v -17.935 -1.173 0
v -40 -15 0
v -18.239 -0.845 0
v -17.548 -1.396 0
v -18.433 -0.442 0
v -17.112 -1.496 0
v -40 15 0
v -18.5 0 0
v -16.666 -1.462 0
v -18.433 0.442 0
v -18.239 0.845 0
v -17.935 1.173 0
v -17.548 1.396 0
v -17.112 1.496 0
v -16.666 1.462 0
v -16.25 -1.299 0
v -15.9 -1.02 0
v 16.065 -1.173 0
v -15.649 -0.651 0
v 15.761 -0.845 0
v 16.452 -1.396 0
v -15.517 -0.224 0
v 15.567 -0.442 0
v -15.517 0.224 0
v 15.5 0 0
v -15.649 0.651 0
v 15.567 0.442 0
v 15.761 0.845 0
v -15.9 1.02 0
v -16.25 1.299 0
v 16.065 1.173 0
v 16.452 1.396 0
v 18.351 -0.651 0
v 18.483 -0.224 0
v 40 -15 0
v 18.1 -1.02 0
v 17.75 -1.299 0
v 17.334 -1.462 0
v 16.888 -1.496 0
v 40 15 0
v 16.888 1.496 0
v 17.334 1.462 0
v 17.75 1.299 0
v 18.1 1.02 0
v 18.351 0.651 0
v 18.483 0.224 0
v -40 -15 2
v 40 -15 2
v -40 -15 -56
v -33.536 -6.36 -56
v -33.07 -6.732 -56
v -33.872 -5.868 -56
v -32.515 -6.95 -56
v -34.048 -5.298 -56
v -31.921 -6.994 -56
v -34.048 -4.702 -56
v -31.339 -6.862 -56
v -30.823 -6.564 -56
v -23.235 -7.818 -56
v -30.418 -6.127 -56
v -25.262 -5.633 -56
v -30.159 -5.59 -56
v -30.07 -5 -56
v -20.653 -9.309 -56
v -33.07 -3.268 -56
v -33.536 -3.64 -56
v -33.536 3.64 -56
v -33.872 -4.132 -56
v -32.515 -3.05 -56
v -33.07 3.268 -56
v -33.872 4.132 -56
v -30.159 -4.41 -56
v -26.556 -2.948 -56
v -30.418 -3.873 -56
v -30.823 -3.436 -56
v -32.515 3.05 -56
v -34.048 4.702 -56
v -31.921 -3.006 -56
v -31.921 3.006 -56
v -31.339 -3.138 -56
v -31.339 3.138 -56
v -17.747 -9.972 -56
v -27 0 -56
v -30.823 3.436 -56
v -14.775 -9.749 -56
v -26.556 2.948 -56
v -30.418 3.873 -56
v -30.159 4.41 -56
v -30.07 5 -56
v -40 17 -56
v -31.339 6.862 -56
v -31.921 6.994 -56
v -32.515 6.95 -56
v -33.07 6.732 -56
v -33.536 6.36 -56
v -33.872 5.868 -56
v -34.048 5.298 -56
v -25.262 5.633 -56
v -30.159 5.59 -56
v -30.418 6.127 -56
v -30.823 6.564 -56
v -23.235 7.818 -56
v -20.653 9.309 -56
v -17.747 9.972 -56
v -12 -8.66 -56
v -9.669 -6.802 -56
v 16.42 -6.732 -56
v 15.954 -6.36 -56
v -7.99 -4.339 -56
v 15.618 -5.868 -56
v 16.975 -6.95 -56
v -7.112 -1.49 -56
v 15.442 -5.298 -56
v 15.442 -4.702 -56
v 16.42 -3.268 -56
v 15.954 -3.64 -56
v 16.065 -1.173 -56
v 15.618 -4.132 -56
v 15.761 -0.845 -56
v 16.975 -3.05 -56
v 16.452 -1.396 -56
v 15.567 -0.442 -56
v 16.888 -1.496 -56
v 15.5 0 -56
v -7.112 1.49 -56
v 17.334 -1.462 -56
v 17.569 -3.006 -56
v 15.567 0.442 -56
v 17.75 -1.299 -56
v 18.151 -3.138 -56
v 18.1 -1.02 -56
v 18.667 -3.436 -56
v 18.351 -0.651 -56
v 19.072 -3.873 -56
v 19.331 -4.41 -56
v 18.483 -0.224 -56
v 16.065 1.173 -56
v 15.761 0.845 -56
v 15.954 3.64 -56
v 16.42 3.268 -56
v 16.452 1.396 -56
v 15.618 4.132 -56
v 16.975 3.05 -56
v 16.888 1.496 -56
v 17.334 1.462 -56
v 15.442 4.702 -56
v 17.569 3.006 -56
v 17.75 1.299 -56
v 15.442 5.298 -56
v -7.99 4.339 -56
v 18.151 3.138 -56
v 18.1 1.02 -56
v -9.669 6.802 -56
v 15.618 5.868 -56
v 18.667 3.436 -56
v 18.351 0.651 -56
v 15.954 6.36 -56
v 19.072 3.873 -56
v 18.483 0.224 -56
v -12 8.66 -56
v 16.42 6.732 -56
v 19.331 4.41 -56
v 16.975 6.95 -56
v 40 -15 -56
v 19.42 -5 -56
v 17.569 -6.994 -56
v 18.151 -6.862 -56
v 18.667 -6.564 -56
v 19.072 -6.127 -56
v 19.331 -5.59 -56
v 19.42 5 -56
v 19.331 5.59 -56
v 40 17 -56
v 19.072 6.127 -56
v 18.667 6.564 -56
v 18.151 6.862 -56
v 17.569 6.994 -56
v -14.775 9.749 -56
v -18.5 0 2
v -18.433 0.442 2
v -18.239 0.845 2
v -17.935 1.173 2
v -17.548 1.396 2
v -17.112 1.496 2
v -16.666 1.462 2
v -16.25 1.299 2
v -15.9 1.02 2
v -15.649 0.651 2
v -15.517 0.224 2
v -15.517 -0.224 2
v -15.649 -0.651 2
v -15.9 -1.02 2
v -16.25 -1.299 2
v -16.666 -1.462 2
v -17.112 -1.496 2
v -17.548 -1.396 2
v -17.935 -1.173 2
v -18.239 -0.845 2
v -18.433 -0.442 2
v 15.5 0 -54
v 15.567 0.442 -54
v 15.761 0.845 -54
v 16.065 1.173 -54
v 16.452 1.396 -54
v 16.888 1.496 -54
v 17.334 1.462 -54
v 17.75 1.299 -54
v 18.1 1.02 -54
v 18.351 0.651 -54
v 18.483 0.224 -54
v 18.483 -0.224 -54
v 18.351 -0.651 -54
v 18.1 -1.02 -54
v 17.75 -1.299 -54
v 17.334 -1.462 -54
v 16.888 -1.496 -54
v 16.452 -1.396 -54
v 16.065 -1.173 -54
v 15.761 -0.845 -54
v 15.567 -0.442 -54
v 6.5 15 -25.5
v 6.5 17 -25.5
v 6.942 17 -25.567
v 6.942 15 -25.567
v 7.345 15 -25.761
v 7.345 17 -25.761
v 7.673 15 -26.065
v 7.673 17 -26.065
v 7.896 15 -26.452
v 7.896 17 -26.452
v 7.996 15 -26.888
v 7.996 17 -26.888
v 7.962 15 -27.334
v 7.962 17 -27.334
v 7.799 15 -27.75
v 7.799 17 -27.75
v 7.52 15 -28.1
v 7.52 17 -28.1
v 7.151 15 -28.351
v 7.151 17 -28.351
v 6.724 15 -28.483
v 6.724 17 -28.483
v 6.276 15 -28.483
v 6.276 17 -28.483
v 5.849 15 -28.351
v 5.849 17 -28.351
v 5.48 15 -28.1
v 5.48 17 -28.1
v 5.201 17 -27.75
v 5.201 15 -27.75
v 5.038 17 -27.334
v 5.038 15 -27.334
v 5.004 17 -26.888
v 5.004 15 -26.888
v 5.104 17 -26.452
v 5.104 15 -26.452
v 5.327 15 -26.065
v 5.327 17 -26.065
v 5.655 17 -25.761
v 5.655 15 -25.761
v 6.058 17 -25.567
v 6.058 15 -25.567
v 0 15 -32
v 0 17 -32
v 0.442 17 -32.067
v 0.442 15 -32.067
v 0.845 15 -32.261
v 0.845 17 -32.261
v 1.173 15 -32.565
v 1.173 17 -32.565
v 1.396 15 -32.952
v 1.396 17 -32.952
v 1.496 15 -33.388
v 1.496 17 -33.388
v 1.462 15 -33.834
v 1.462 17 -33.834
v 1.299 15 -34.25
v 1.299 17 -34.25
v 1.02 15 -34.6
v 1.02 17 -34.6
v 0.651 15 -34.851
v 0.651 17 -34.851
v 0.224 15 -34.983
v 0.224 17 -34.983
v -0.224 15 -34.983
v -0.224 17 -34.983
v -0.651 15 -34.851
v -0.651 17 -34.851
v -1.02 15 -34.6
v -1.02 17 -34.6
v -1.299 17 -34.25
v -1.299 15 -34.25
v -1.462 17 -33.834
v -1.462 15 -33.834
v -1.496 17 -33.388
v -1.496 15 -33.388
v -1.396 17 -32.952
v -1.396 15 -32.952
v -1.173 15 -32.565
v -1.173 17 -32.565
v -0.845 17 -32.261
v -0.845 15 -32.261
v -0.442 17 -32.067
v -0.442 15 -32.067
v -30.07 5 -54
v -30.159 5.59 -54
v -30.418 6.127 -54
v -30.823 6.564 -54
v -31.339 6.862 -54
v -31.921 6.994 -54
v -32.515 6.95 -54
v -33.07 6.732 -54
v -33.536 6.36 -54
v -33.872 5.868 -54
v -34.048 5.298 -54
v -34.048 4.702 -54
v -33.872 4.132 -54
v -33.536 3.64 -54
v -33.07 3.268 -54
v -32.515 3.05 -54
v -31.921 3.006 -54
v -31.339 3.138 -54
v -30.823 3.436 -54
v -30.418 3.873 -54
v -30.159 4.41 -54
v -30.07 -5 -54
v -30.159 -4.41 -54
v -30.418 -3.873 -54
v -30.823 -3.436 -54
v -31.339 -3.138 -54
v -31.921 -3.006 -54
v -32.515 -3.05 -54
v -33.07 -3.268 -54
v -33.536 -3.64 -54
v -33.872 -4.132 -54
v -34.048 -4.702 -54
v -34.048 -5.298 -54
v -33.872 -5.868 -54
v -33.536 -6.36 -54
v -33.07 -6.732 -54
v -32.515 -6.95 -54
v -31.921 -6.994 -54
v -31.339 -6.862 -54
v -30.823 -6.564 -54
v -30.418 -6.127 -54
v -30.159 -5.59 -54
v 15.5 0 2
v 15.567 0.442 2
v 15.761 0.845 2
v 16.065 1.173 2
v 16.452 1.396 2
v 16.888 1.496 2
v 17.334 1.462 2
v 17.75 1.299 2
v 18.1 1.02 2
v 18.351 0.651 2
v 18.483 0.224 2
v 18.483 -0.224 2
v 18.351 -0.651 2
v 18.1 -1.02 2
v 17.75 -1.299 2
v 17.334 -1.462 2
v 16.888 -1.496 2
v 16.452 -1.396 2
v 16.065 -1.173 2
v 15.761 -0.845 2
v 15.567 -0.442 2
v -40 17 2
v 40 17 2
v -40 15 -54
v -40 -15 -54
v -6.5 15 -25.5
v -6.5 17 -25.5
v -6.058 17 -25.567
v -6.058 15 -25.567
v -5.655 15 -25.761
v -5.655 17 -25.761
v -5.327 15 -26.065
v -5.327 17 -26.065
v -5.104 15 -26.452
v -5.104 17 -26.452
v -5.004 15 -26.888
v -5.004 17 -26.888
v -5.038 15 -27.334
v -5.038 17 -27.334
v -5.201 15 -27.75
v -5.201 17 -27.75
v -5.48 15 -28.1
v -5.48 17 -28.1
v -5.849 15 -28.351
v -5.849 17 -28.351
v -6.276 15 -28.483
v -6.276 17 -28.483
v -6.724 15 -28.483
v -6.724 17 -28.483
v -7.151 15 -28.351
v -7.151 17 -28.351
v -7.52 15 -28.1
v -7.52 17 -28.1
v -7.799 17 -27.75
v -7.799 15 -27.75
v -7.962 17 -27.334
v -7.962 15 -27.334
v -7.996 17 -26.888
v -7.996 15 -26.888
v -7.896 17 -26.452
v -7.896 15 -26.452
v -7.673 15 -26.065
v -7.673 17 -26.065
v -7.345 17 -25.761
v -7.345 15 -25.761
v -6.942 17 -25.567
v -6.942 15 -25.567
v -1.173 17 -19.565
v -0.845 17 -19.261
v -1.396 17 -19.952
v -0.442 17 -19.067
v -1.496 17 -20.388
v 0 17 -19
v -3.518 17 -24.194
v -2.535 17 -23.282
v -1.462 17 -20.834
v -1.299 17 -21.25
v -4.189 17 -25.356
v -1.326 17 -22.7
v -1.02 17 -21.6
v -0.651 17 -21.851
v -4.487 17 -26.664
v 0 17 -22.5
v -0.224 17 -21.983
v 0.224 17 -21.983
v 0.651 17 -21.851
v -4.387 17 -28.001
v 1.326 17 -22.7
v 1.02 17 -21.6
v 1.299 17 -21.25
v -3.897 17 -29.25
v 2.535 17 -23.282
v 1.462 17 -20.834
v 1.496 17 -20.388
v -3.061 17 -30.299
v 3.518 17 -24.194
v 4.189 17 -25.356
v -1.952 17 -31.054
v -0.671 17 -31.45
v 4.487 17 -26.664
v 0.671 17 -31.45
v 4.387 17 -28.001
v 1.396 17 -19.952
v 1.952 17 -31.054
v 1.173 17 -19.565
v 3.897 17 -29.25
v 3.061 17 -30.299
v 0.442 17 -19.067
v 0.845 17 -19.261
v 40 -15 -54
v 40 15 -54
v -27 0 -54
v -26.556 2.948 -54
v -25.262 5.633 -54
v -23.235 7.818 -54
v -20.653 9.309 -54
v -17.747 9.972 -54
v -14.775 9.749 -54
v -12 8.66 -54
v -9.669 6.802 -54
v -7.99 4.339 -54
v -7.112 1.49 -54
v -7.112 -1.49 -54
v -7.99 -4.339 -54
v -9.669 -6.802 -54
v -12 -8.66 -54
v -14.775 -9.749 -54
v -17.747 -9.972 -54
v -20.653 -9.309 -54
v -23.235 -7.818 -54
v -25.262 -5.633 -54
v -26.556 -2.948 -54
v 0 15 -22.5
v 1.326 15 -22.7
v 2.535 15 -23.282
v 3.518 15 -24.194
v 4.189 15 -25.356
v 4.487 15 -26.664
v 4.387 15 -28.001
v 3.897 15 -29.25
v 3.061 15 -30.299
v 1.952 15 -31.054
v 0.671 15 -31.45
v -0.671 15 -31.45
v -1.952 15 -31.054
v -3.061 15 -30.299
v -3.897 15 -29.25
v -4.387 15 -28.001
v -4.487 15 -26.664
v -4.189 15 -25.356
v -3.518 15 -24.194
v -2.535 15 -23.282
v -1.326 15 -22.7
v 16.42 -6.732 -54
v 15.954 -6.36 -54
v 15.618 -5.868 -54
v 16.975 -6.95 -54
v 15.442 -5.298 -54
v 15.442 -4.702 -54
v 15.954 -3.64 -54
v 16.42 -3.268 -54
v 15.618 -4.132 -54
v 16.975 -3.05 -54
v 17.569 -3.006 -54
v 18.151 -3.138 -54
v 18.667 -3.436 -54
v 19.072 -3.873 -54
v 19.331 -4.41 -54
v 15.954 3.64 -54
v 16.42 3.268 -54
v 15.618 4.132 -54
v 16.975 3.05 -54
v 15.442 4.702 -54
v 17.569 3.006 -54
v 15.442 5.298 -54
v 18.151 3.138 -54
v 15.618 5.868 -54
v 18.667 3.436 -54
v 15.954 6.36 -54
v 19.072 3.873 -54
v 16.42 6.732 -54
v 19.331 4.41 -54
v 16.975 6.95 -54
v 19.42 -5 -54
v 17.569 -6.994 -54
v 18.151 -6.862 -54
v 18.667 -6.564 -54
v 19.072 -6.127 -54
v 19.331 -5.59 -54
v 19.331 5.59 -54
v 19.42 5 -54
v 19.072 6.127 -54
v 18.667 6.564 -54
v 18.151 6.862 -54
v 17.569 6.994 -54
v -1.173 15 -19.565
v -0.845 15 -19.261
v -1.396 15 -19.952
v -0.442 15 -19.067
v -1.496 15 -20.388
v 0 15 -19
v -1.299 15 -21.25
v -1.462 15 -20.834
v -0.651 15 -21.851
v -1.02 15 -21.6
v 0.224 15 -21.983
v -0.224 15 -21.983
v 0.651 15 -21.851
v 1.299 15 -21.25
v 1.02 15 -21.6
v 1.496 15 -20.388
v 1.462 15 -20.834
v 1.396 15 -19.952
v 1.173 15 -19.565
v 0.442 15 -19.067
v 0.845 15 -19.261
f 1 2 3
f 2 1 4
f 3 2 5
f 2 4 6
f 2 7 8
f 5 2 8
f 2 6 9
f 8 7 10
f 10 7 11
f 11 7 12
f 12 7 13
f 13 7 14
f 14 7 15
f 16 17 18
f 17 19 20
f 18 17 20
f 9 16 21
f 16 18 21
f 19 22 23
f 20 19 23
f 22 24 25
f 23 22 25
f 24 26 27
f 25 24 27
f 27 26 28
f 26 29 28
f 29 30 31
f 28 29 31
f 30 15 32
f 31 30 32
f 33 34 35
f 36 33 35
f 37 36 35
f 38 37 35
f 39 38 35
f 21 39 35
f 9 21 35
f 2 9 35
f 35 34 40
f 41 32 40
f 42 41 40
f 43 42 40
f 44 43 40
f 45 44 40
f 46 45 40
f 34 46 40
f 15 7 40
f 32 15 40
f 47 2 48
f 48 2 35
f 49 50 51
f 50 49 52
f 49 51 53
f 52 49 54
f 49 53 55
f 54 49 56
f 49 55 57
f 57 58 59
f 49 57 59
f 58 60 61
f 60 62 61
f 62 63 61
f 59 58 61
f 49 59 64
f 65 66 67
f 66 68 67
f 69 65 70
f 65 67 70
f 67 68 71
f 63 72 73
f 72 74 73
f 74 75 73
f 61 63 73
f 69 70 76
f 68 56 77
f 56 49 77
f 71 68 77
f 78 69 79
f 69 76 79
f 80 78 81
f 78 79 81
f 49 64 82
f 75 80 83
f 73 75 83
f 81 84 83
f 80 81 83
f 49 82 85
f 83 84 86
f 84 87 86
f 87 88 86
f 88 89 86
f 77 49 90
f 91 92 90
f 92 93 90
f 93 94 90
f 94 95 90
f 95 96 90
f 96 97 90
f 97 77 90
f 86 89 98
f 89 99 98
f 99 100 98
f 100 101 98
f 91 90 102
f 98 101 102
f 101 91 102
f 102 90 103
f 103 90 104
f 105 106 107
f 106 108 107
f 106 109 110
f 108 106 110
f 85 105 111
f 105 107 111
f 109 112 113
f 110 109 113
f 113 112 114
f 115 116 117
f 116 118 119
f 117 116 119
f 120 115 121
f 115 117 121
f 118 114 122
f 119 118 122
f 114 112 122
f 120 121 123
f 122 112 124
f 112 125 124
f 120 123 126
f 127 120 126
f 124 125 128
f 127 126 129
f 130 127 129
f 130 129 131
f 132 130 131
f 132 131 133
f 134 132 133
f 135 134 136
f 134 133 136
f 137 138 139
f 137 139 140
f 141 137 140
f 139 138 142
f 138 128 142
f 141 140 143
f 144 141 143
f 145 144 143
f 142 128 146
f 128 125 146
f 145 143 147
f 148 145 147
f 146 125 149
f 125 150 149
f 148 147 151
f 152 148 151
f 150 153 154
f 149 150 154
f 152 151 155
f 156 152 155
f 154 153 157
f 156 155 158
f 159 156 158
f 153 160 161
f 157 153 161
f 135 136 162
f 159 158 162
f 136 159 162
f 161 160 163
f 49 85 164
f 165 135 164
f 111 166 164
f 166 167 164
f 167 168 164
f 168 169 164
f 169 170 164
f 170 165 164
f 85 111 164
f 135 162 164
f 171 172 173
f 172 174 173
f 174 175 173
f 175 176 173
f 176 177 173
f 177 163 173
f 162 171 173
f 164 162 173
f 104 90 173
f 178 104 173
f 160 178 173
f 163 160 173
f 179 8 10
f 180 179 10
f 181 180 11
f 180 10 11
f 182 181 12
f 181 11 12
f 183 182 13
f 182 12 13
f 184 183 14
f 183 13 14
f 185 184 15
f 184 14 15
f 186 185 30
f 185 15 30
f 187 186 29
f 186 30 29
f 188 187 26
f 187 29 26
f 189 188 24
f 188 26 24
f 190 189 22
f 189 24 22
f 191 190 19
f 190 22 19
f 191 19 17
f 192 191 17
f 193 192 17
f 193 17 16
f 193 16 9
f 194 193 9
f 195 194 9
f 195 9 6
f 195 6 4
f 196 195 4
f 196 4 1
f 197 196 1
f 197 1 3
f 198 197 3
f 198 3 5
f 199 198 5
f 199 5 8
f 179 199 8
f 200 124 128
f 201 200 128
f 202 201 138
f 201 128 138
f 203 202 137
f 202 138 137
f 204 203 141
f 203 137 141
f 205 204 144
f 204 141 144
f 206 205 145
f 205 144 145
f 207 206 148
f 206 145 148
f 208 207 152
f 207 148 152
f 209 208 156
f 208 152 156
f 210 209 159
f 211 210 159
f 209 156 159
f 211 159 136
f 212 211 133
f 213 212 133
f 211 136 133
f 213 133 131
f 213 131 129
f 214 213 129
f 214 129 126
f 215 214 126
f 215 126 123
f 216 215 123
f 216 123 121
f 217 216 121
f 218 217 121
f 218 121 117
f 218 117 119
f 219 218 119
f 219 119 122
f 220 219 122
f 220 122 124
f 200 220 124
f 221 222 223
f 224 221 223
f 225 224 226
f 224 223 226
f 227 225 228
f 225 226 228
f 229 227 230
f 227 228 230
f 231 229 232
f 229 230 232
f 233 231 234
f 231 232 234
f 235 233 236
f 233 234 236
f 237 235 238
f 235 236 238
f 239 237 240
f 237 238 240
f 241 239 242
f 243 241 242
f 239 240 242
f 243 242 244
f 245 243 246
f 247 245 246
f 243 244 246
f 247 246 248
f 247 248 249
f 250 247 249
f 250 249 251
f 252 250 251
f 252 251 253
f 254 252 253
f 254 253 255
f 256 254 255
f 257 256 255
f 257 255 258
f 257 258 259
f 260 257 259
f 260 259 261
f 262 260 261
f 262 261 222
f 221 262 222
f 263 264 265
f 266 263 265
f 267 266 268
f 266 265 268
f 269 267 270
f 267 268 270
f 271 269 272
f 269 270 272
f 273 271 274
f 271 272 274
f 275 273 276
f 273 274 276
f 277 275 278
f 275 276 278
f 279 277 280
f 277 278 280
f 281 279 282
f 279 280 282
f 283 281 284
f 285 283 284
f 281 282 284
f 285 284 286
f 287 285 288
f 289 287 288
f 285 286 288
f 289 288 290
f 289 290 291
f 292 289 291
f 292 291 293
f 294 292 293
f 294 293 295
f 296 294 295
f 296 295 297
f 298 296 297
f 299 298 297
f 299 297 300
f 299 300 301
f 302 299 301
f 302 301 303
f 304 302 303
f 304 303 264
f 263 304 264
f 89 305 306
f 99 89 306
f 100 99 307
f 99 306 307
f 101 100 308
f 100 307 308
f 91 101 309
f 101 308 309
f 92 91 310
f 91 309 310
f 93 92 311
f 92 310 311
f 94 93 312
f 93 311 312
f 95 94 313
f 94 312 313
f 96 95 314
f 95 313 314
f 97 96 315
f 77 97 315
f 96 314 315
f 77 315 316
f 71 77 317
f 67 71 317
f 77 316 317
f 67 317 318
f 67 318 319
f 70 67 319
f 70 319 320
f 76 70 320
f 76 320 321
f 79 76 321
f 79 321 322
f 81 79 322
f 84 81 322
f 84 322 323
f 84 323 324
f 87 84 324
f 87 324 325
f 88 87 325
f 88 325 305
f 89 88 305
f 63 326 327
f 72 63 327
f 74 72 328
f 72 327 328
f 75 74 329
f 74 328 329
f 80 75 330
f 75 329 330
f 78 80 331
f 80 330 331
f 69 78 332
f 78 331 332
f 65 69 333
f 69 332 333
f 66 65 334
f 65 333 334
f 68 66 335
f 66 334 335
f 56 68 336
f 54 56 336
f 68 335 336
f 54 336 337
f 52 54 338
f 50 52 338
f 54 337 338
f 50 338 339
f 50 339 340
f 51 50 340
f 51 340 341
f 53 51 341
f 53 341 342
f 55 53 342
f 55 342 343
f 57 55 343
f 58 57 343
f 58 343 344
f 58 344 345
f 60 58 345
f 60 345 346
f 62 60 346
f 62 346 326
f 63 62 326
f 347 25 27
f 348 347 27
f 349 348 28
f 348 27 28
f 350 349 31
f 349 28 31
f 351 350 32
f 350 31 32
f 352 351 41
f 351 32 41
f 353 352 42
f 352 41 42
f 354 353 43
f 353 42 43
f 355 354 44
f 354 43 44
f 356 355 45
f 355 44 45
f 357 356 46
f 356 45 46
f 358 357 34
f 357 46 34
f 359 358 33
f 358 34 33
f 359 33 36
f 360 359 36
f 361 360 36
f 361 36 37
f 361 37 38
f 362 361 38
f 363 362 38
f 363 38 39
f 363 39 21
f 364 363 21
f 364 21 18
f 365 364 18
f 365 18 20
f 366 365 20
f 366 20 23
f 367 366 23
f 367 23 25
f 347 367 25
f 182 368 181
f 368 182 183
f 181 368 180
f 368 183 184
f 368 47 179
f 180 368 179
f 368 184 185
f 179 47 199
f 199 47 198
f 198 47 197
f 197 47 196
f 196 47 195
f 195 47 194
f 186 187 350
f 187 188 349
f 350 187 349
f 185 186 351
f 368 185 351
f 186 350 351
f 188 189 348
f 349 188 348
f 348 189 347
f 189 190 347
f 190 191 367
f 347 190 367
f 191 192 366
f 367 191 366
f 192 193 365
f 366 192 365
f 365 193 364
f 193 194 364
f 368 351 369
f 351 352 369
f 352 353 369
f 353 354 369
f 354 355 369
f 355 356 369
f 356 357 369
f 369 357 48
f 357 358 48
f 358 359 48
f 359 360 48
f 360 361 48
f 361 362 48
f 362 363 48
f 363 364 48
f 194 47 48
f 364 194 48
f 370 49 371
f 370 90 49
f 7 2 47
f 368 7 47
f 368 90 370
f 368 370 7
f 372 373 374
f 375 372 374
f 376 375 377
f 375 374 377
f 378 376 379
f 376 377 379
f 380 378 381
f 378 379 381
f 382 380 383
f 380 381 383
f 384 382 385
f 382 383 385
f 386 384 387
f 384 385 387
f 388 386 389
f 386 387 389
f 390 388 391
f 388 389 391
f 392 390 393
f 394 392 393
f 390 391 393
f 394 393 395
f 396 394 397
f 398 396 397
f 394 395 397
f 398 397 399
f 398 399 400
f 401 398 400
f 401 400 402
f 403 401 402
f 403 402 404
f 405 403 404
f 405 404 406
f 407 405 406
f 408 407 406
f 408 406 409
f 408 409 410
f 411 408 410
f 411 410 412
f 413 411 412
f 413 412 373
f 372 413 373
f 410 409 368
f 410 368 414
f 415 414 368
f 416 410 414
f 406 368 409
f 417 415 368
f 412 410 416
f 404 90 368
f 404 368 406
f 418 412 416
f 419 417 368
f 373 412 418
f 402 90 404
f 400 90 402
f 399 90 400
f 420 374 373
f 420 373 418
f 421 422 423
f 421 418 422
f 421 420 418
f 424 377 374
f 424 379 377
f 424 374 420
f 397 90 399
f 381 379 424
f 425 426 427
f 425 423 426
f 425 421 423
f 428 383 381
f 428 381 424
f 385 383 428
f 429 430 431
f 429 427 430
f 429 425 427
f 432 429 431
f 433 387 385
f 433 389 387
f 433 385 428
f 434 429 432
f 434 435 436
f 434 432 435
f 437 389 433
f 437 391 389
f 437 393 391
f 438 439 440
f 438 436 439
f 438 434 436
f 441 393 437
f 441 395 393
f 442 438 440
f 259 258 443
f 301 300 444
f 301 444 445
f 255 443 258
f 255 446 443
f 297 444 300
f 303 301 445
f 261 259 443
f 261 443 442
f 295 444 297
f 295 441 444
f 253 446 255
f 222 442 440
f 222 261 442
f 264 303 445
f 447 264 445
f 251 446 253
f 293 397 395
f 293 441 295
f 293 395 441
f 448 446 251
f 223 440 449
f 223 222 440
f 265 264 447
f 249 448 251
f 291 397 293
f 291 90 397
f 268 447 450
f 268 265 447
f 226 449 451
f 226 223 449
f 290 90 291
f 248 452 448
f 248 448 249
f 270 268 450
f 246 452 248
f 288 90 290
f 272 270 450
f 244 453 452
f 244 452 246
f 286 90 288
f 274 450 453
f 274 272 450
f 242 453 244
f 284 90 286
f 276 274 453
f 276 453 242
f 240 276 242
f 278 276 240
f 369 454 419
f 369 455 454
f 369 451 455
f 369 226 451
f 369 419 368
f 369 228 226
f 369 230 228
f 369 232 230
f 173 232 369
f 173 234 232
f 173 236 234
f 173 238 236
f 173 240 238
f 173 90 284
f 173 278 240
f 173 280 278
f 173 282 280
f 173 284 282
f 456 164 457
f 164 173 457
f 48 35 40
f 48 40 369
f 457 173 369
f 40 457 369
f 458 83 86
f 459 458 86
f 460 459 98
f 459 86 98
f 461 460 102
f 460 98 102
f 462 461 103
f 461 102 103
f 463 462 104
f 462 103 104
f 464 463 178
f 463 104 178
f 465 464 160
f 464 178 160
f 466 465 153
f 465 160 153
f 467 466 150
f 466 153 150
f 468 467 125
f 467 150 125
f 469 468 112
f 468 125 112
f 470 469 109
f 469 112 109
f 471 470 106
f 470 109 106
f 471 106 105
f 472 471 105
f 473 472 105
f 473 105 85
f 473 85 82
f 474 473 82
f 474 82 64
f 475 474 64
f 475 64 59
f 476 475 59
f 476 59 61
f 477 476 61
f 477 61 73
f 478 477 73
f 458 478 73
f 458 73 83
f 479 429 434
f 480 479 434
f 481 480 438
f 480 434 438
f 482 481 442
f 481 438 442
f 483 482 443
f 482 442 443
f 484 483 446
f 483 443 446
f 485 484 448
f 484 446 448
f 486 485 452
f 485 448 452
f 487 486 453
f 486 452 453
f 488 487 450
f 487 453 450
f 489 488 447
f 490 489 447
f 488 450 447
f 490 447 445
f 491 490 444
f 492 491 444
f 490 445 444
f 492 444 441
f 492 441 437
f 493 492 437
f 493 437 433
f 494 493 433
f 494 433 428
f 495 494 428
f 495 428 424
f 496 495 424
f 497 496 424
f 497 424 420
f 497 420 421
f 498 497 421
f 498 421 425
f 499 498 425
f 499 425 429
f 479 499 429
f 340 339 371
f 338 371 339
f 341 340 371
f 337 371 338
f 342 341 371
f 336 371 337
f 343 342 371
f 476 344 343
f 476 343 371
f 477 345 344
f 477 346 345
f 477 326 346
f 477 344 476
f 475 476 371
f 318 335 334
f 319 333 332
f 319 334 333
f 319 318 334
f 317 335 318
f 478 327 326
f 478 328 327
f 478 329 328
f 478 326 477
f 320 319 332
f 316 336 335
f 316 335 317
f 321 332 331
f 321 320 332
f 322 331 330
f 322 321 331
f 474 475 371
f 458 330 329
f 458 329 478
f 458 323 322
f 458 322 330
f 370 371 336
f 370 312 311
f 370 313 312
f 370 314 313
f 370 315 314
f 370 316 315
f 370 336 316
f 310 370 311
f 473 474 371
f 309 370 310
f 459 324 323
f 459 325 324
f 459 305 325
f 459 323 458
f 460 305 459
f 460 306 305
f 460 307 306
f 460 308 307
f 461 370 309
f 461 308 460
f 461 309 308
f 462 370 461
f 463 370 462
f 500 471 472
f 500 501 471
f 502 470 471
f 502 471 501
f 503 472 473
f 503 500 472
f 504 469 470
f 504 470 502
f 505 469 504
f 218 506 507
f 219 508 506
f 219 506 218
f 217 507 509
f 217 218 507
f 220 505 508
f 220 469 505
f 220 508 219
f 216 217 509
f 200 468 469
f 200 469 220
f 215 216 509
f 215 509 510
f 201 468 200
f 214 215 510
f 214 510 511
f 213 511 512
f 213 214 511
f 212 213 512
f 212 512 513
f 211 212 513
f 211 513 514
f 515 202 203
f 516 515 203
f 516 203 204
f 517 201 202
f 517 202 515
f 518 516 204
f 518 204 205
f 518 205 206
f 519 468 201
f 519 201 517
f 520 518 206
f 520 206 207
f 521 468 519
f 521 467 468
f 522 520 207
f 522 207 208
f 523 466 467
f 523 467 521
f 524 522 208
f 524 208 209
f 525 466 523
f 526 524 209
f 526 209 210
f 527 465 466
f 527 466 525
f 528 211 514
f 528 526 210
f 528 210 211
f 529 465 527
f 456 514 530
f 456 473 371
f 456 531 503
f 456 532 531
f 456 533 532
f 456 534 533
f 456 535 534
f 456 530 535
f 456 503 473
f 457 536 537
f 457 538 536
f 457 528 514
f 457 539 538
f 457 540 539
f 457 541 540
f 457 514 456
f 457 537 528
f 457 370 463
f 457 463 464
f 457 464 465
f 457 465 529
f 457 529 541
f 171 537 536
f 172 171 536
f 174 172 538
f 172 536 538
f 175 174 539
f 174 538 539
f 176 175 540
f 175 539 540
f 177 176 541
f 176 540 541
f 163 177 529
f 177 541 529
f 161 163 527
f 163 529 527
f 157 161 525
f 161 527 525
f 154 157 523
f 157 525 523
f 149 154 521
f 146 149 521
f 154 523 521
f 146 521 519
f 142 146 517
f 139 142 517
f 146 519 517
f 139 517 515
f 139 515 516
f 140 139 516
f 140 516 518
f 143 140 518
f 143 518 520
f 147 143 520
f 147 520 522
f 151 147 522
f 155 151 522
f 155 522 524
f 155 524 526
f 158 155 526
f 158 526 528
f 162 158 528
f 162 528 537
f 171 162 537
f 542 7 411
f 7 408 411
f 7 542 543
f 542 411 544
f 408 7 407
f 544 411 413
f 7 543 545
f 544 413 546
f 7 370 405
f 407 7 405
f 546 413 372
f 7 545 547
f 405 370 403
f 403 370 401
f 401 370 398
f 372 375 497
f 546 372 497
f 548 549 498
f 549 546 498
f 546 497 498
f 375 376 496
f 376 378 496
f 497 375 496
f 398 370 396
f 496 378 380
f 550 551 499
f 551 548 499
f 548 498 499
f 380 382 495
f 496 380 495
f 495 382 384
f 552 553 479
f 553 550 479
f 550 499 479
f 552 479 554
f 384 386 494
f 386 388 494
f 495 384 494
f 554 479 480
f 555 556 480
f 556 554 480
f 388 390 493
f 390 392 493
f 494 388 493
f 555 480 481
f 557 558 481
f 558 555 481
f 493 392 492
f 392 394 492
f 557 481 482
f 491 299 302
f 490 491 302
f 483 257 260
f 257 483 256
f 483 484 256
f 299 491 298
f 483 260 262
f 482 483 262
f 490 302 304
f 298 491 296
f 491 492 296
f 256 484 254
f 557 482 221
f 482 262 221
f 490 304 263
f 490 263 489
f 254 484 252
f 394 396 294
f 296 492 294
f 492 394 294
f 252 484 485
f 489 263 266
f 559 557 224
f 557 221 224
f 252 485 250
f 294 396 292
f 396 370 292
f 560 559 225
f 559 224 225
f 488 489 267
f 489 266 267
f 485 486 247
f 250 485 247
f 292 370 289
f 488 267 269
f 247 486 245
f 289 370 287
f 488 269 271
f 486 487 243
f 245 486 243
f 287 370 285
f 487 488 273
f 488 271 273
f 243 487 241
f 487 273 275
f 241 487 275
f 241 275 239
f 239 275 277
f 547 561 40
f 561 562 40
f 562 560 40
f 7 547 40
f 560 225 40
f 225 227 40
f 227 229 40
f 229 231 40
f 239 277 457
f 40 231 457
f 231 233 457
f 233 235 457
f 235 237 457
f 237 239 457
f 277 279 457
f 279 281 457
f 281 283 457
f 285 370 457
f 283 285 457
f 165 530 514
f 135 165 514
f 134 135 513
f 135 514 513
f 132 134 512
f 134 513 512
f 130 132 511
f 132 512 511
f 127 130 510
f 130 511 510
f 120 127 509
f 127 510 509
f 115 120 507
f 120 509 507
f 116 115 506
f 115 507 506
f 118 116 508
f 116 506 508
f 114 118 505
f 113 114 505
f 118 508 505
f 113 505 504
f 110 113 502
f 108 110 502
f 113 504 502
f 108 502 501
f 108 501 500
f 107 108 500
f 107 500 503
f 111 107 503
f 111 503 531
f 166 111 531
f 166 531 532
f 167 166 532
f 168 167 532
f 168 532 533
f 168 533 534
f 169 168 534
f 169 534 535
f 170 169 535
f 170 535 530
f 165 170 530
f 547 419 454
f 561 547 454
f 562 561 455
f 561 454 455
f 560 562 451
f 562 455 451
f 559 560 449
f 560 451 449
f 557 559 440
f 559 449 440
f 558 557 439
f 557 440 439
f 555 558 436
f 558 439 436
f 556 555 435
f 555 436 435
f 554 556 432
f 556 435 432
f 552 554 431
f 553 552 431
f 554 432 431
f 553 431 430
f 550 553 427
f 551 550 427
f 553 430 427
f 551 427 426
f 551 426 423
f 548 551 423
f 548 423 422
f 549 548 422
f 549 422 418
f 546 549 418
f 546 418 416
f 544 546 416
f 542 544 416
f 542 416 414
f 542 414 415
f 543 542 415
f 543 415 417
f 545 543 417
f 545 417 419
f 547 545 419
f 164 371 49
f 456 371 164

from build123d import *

# Parameters (mm, degrees)
SKETCH_1_W          = 80
SKETCH_1_H          = 30
EXTRUDE_1_DEPTH     = 2
SKETCH_2_W          = 80
SKETCH_2_H          = 58
EXTRUDE_2_DEPTH     = 2
SKETCH_3_W          = 80
SKETCH_3_H          = 2
EXTRUDE_3_DEPTH     = 30
CUT_EXTRUDE_1_REACH = 77.895
SKETCH_5_R          = 4.5
SKETCH_5_R_2        = 1.5
CUT_EXTRUDE_3_REACH = 74.478
SKETCH_6_R          = 1.5
CUT_EXTRUDE_4_REACH = 74.478
SKETCH_7_R          = 10
CUT_EXTRUDE_5_REACH = 72.887
SKETCH_8_R          = 2
CUT_EXTRUDE_6_REACH = 72.887
SKETCH_9_R          = 2


with BuildPart() as part:
    # 草图1 → 凸台-拉伸1 (new body)
    with BuildSketch(Plane.XY):
        Rectangle(SKETCH_1_W, SKETCH_1_H)
    extrude(amount=EXTRUDE_1_DEPTH)

    # 草图2 → 凸台-拉伸2 (add)
    with BuildSketch(Plane(origin=(0, 15, 0), x_dir=(1, 0, 0), z_dir=(0, 1, 0))):
        with Locations((0, 27)):
            Rectangle(SKETCH_2_W, SKETCH_2_H)
    extrude(amount=EXTRUDE_2_DEPTH)

    # 草图3 → 凸台-拉伸3 (add)
    with BuildSketch(Plane.XZ.offset(-15)):
        with Locations((0, -55)):
            Rectangle(SKETCH_3_W, SKETCH_3_H)
    extrude(amount=EXTRUDE_3_DEPTH)

    # 草图5 → 切除-拉伸1 (cut, up to next)
    with BuildSketch(Plane(origin=(0, 17, 0), x_dir=(1, 0, 0), z_dir=(0, 1, 0)), mode=Mode.PRIVATE) as cut_extrude_1_sk1:
        with Locations(Location((0, 27, 0), (0, 0, 270))):
            Circle(SKETCH_5_R)
    cut_extrude_1_tool1 = extrude(cut_extrude_1_sk1.sketch, amount=-CUT_EXTRUDE_1_REACH, mode=Mode.PRIVATE) & part.part
    # 草图5 → 切除-拉伸1 (cut, up to next)
    with BuildSketch(Plane(origin=(0, 17, 0), x_dir=(1, 0, 0), z_dir=(0, 1, 0)), mode=Mode.PRIVATE) as cut_extrude_1_sk2:
        with Locations(Location((-6.5, 27, 0), (0, 0, 270))):
            Circle(SKETCH_5_R_2)
    cut_extrude_1_tool2 = extrude(cut_extrude_1_sk2.sketch, amount=-CUT_EXTRUDE_1_REACH, mode=Mode.PRIVATE) & part.part
    # 草图5 → 切除-拉伸1 (cut, up to next)
    with BuildSketch(Plane(origin=(0, 17, 0), x_dir=(1, 0, 0), z_dir=(0, 1, 0)), mode=Mode.PRIVATE) as cut_extrude_1_sk3:
        with Locations(Location((6.5, 27, 0), (0, 0, 270))):
            Circle(SKETCH_5_R_2)
    cut_extrude_1_tool3 = extrude(cut_extrude_1_sk3.sketch, amount=-CUT_EXTRUDE_1_REACH, mode=Mode.PRIVATE) & part.part
    # 草图5 → 切除-拉伸1 (cut, up to next)
    with BuildSketch(Plane(origin=(0, 17, 0), x_dir=(1, 0, 0), z_dir=(0, 1, 0)), mode=Mode.PRIVATE) as cut_extrude_1_sk4:
        with Locations(Location((0, 33.5, 0), (0, 0, 270))):
            Circle(SKETCH_5_R_2)
    cut_extrude_1_tool4 = extrude(cut_extrude_1_sk4.sketch, amount=-CUT_EXTRUDE_1_REACH, mode=Mode.PRIVATE) & part.part
    # 草图5 → 切除-拉伸1 (cut, up to next)
    with BuildSketch(Plane(origin=(0, 17, 0), x_dir=(1, 0, 0), z_dir=(0, 1, 0)), mode=Mode.PRIVATE) as cut_extrude_1_sk5:
        with Locations(Location((0, 20.5, 0), (0, 0, 270))):
            Circle(SKETCH_5_R_2)
    cut_extrude_1_tool5 = extrude(cut_extrude_1_sk5.sketch, amount=-CUT_EXTRUDE_1_REACH, mode=Mode.PRIVATE) & part.part
    add(cut_extrude_1_tool1.solids().sort_by_distance((0, 17, -27))[0], mode=Mode.SUBTRACT)
    add(cut_extrude_1_tool2.solids().sort_by_distance((-6.5, 17, -27))[0], mode=Mode.SUBTRACT)
    add(cut_extrude_1_tool3.solids().sort_by_distance((6.5, 17, -27))[0], mode=Mode.SUBTRACT)
    add(cut_extrude_1_tool4.solids().sort_by_distance((0, 17, -33.5))[0], mode=Mode.SUBTRACT)
    add(cut_extrude_1_tool5.solids().sort_by_distance((0, 17, -20.5))[0], mode=Mode.SUBTRACT)

    # 切除-拉伸3: up to this face of the body (flat: up to its plane)
    cut_extrude_3_end = Plane(part.part.faces().sort_by_distance((0, 1, 2))[0])
    # 草图6 → 切除-拉伸3 (cut, up to the picked face)
    with BuildSketch(Plane(origin=(0, 0, -56), x_dir=(-1, 0, 0), z_dir=(0, 0, -1)), mode=Mode.PRIVATE) as cut_extrude_3_sk1:
        with Locations((-17, 0)):
            Circle(SKETCH_6_R)
    cut_extrude_3_tool1 = split(extrude(cut_extrude_3_sk1.sketch, amount=-CUT_EXTRUDE_3_REACH, mode=Mode.PRIVATE), bisect_by=cut_extrude_3_end, keep=Keep.BOTH, mode=Mode.PRIVATE)
    # 草图6 → 切除-拉伸3 (cut, up to the picked face)
    with BuildSketch(Plane(origin=(0, 0, -56), x_dir=(-1, 0, 0), z_dir=(0, 0, -1)), mode=Mode.PRIVATE) as cut_extrude_3_sk2:
        with Locations((17, 0)):
            Circle(SKETCH_6_R)
    cut_extrude_3_tool2 = split(extrude(cut_extrude_3_sk2.sketch, amount=-CUT_EXTRUDE_3_REACH, mode=Mode.PRIVATE), bisect_by=cut_extrude_3_end, keep=Keep.BOTH, mode=Mode.PRIVATE)
    add(cut_extrude_3_tool1.solids().sort_by(Axis((17, 0, -56), (0, 0, 1)))[0], mode=Mode.SUBTRACT)
    add(cut_extrude_3_tool2.solids().sort_by(Axis((-17, 0, -56), (0, 0, 1)))[0], mode=Mode.SUBTRACT)

    # 草图7 → 切除-拉伸4 (cut, up to next)
    with BuildSketch(Plane(origin=(0, 0, -56), x_dir=(-1, 0, 0), z_dir=(0, 0, -1)), mode=Mode.PRIVATE) as cut_extrude_4_sk1:
        with Locations((17, 0)):
            Circle(SKETCH_7_R)
    cut_extrude_4_tool1 = extrude(cut_extrude_4_sk1.sketch, amount=-CUT_EXTRUDE_4_REACH, mode=Mode.PRIVATE) & part.part
    add(cut_extrude_4_tool1.solids().sort_by_distance((-17, 0, -56))[0], mode=Mode.SUBTRACT)

    # 草图8 → 切除-拉伸5 (cut, up to next)
    with BuildSketch(Plane.XY.offset(-54), mode=Mode.PRIVATE) as cut_extrude_5_sk1:
        with Locations((17.42, 5)):
            Circle(SKETCH_8_R)
    cut_extrude_5_tool1 = extrude(cut_extrude_5_sk1.sketch, amount=-CUT_EXTRUDE_5_REACH, mode=Mode.PRIVATE) & part.part
    # 草图8 → 切除-拉伸5 (cut, up to next)
    with BuildSketch(Plane.XY.offset(-54), mode=Mode.PRIVATE) as cut_extrude_5_sk2:
        with Locations((17.42, -5)):
            Circle(SKETCH_8_R)
    cut_extrude_5_tool2 = extrude(cut_extrude_5_sk2.sketch, amount=-CUT_EXTRUDE_5_REACH, mode=Mode.PRIVATE) & part.part
    add(cut_extrude_5_tool1.solids().sort_by_distance((17.42, 5, -54))[0], mode=Mode.SUBTRACT)
    add(cut_extrude_5_tool2.solids().sort_by_distance((17.42, -5, -54))[0], mode=Mode.SUBTRACT)

    # 草图9 → 切除-拉伸6 (cut, up to next)
    with BuildSketch(Plane.XY.offset(-54), mode=Mode.PRIVATE) as cut_extrude_6_sk1:
        with Locations((-32.07, 5)):
            Circle(SKETCH_9_R)
    cut_extrude_6_tool1 = extrude(cut_extrude_6_sk1.sketch, amount=-CUT_EXTRUDE_6_REACH, mode=Mode.PRIVATE) & part.part
    # 草图9 → 切除-拉伸6 (cut, up to next)
    with BuildSketch(Plane.XY.offset(-54), mode=Mode.PRIVATE) as cut_extrude_6_sk2:
        with Locations((-32.07, -5)):
            Circle(SKETCH_9_R)
    cut_extrude_6_tool2 = extrude(cut_extrude_6_sk2.sketch, amount=-CUT_EXTRUDE_6_REACH, mode=Mode.PRIVATE) & part.part
    add(cut_extrude_6_tool1.solids().sort_by_distance((-32.07, 5, -54))[0], mode=Mode.SUBTRACT)
    add(cut_extrude_6_tool2.solids().sort_by_distance((-32.07, -5, -54))[0], mode=Mode.SUBTRACT)


solid = part.part
